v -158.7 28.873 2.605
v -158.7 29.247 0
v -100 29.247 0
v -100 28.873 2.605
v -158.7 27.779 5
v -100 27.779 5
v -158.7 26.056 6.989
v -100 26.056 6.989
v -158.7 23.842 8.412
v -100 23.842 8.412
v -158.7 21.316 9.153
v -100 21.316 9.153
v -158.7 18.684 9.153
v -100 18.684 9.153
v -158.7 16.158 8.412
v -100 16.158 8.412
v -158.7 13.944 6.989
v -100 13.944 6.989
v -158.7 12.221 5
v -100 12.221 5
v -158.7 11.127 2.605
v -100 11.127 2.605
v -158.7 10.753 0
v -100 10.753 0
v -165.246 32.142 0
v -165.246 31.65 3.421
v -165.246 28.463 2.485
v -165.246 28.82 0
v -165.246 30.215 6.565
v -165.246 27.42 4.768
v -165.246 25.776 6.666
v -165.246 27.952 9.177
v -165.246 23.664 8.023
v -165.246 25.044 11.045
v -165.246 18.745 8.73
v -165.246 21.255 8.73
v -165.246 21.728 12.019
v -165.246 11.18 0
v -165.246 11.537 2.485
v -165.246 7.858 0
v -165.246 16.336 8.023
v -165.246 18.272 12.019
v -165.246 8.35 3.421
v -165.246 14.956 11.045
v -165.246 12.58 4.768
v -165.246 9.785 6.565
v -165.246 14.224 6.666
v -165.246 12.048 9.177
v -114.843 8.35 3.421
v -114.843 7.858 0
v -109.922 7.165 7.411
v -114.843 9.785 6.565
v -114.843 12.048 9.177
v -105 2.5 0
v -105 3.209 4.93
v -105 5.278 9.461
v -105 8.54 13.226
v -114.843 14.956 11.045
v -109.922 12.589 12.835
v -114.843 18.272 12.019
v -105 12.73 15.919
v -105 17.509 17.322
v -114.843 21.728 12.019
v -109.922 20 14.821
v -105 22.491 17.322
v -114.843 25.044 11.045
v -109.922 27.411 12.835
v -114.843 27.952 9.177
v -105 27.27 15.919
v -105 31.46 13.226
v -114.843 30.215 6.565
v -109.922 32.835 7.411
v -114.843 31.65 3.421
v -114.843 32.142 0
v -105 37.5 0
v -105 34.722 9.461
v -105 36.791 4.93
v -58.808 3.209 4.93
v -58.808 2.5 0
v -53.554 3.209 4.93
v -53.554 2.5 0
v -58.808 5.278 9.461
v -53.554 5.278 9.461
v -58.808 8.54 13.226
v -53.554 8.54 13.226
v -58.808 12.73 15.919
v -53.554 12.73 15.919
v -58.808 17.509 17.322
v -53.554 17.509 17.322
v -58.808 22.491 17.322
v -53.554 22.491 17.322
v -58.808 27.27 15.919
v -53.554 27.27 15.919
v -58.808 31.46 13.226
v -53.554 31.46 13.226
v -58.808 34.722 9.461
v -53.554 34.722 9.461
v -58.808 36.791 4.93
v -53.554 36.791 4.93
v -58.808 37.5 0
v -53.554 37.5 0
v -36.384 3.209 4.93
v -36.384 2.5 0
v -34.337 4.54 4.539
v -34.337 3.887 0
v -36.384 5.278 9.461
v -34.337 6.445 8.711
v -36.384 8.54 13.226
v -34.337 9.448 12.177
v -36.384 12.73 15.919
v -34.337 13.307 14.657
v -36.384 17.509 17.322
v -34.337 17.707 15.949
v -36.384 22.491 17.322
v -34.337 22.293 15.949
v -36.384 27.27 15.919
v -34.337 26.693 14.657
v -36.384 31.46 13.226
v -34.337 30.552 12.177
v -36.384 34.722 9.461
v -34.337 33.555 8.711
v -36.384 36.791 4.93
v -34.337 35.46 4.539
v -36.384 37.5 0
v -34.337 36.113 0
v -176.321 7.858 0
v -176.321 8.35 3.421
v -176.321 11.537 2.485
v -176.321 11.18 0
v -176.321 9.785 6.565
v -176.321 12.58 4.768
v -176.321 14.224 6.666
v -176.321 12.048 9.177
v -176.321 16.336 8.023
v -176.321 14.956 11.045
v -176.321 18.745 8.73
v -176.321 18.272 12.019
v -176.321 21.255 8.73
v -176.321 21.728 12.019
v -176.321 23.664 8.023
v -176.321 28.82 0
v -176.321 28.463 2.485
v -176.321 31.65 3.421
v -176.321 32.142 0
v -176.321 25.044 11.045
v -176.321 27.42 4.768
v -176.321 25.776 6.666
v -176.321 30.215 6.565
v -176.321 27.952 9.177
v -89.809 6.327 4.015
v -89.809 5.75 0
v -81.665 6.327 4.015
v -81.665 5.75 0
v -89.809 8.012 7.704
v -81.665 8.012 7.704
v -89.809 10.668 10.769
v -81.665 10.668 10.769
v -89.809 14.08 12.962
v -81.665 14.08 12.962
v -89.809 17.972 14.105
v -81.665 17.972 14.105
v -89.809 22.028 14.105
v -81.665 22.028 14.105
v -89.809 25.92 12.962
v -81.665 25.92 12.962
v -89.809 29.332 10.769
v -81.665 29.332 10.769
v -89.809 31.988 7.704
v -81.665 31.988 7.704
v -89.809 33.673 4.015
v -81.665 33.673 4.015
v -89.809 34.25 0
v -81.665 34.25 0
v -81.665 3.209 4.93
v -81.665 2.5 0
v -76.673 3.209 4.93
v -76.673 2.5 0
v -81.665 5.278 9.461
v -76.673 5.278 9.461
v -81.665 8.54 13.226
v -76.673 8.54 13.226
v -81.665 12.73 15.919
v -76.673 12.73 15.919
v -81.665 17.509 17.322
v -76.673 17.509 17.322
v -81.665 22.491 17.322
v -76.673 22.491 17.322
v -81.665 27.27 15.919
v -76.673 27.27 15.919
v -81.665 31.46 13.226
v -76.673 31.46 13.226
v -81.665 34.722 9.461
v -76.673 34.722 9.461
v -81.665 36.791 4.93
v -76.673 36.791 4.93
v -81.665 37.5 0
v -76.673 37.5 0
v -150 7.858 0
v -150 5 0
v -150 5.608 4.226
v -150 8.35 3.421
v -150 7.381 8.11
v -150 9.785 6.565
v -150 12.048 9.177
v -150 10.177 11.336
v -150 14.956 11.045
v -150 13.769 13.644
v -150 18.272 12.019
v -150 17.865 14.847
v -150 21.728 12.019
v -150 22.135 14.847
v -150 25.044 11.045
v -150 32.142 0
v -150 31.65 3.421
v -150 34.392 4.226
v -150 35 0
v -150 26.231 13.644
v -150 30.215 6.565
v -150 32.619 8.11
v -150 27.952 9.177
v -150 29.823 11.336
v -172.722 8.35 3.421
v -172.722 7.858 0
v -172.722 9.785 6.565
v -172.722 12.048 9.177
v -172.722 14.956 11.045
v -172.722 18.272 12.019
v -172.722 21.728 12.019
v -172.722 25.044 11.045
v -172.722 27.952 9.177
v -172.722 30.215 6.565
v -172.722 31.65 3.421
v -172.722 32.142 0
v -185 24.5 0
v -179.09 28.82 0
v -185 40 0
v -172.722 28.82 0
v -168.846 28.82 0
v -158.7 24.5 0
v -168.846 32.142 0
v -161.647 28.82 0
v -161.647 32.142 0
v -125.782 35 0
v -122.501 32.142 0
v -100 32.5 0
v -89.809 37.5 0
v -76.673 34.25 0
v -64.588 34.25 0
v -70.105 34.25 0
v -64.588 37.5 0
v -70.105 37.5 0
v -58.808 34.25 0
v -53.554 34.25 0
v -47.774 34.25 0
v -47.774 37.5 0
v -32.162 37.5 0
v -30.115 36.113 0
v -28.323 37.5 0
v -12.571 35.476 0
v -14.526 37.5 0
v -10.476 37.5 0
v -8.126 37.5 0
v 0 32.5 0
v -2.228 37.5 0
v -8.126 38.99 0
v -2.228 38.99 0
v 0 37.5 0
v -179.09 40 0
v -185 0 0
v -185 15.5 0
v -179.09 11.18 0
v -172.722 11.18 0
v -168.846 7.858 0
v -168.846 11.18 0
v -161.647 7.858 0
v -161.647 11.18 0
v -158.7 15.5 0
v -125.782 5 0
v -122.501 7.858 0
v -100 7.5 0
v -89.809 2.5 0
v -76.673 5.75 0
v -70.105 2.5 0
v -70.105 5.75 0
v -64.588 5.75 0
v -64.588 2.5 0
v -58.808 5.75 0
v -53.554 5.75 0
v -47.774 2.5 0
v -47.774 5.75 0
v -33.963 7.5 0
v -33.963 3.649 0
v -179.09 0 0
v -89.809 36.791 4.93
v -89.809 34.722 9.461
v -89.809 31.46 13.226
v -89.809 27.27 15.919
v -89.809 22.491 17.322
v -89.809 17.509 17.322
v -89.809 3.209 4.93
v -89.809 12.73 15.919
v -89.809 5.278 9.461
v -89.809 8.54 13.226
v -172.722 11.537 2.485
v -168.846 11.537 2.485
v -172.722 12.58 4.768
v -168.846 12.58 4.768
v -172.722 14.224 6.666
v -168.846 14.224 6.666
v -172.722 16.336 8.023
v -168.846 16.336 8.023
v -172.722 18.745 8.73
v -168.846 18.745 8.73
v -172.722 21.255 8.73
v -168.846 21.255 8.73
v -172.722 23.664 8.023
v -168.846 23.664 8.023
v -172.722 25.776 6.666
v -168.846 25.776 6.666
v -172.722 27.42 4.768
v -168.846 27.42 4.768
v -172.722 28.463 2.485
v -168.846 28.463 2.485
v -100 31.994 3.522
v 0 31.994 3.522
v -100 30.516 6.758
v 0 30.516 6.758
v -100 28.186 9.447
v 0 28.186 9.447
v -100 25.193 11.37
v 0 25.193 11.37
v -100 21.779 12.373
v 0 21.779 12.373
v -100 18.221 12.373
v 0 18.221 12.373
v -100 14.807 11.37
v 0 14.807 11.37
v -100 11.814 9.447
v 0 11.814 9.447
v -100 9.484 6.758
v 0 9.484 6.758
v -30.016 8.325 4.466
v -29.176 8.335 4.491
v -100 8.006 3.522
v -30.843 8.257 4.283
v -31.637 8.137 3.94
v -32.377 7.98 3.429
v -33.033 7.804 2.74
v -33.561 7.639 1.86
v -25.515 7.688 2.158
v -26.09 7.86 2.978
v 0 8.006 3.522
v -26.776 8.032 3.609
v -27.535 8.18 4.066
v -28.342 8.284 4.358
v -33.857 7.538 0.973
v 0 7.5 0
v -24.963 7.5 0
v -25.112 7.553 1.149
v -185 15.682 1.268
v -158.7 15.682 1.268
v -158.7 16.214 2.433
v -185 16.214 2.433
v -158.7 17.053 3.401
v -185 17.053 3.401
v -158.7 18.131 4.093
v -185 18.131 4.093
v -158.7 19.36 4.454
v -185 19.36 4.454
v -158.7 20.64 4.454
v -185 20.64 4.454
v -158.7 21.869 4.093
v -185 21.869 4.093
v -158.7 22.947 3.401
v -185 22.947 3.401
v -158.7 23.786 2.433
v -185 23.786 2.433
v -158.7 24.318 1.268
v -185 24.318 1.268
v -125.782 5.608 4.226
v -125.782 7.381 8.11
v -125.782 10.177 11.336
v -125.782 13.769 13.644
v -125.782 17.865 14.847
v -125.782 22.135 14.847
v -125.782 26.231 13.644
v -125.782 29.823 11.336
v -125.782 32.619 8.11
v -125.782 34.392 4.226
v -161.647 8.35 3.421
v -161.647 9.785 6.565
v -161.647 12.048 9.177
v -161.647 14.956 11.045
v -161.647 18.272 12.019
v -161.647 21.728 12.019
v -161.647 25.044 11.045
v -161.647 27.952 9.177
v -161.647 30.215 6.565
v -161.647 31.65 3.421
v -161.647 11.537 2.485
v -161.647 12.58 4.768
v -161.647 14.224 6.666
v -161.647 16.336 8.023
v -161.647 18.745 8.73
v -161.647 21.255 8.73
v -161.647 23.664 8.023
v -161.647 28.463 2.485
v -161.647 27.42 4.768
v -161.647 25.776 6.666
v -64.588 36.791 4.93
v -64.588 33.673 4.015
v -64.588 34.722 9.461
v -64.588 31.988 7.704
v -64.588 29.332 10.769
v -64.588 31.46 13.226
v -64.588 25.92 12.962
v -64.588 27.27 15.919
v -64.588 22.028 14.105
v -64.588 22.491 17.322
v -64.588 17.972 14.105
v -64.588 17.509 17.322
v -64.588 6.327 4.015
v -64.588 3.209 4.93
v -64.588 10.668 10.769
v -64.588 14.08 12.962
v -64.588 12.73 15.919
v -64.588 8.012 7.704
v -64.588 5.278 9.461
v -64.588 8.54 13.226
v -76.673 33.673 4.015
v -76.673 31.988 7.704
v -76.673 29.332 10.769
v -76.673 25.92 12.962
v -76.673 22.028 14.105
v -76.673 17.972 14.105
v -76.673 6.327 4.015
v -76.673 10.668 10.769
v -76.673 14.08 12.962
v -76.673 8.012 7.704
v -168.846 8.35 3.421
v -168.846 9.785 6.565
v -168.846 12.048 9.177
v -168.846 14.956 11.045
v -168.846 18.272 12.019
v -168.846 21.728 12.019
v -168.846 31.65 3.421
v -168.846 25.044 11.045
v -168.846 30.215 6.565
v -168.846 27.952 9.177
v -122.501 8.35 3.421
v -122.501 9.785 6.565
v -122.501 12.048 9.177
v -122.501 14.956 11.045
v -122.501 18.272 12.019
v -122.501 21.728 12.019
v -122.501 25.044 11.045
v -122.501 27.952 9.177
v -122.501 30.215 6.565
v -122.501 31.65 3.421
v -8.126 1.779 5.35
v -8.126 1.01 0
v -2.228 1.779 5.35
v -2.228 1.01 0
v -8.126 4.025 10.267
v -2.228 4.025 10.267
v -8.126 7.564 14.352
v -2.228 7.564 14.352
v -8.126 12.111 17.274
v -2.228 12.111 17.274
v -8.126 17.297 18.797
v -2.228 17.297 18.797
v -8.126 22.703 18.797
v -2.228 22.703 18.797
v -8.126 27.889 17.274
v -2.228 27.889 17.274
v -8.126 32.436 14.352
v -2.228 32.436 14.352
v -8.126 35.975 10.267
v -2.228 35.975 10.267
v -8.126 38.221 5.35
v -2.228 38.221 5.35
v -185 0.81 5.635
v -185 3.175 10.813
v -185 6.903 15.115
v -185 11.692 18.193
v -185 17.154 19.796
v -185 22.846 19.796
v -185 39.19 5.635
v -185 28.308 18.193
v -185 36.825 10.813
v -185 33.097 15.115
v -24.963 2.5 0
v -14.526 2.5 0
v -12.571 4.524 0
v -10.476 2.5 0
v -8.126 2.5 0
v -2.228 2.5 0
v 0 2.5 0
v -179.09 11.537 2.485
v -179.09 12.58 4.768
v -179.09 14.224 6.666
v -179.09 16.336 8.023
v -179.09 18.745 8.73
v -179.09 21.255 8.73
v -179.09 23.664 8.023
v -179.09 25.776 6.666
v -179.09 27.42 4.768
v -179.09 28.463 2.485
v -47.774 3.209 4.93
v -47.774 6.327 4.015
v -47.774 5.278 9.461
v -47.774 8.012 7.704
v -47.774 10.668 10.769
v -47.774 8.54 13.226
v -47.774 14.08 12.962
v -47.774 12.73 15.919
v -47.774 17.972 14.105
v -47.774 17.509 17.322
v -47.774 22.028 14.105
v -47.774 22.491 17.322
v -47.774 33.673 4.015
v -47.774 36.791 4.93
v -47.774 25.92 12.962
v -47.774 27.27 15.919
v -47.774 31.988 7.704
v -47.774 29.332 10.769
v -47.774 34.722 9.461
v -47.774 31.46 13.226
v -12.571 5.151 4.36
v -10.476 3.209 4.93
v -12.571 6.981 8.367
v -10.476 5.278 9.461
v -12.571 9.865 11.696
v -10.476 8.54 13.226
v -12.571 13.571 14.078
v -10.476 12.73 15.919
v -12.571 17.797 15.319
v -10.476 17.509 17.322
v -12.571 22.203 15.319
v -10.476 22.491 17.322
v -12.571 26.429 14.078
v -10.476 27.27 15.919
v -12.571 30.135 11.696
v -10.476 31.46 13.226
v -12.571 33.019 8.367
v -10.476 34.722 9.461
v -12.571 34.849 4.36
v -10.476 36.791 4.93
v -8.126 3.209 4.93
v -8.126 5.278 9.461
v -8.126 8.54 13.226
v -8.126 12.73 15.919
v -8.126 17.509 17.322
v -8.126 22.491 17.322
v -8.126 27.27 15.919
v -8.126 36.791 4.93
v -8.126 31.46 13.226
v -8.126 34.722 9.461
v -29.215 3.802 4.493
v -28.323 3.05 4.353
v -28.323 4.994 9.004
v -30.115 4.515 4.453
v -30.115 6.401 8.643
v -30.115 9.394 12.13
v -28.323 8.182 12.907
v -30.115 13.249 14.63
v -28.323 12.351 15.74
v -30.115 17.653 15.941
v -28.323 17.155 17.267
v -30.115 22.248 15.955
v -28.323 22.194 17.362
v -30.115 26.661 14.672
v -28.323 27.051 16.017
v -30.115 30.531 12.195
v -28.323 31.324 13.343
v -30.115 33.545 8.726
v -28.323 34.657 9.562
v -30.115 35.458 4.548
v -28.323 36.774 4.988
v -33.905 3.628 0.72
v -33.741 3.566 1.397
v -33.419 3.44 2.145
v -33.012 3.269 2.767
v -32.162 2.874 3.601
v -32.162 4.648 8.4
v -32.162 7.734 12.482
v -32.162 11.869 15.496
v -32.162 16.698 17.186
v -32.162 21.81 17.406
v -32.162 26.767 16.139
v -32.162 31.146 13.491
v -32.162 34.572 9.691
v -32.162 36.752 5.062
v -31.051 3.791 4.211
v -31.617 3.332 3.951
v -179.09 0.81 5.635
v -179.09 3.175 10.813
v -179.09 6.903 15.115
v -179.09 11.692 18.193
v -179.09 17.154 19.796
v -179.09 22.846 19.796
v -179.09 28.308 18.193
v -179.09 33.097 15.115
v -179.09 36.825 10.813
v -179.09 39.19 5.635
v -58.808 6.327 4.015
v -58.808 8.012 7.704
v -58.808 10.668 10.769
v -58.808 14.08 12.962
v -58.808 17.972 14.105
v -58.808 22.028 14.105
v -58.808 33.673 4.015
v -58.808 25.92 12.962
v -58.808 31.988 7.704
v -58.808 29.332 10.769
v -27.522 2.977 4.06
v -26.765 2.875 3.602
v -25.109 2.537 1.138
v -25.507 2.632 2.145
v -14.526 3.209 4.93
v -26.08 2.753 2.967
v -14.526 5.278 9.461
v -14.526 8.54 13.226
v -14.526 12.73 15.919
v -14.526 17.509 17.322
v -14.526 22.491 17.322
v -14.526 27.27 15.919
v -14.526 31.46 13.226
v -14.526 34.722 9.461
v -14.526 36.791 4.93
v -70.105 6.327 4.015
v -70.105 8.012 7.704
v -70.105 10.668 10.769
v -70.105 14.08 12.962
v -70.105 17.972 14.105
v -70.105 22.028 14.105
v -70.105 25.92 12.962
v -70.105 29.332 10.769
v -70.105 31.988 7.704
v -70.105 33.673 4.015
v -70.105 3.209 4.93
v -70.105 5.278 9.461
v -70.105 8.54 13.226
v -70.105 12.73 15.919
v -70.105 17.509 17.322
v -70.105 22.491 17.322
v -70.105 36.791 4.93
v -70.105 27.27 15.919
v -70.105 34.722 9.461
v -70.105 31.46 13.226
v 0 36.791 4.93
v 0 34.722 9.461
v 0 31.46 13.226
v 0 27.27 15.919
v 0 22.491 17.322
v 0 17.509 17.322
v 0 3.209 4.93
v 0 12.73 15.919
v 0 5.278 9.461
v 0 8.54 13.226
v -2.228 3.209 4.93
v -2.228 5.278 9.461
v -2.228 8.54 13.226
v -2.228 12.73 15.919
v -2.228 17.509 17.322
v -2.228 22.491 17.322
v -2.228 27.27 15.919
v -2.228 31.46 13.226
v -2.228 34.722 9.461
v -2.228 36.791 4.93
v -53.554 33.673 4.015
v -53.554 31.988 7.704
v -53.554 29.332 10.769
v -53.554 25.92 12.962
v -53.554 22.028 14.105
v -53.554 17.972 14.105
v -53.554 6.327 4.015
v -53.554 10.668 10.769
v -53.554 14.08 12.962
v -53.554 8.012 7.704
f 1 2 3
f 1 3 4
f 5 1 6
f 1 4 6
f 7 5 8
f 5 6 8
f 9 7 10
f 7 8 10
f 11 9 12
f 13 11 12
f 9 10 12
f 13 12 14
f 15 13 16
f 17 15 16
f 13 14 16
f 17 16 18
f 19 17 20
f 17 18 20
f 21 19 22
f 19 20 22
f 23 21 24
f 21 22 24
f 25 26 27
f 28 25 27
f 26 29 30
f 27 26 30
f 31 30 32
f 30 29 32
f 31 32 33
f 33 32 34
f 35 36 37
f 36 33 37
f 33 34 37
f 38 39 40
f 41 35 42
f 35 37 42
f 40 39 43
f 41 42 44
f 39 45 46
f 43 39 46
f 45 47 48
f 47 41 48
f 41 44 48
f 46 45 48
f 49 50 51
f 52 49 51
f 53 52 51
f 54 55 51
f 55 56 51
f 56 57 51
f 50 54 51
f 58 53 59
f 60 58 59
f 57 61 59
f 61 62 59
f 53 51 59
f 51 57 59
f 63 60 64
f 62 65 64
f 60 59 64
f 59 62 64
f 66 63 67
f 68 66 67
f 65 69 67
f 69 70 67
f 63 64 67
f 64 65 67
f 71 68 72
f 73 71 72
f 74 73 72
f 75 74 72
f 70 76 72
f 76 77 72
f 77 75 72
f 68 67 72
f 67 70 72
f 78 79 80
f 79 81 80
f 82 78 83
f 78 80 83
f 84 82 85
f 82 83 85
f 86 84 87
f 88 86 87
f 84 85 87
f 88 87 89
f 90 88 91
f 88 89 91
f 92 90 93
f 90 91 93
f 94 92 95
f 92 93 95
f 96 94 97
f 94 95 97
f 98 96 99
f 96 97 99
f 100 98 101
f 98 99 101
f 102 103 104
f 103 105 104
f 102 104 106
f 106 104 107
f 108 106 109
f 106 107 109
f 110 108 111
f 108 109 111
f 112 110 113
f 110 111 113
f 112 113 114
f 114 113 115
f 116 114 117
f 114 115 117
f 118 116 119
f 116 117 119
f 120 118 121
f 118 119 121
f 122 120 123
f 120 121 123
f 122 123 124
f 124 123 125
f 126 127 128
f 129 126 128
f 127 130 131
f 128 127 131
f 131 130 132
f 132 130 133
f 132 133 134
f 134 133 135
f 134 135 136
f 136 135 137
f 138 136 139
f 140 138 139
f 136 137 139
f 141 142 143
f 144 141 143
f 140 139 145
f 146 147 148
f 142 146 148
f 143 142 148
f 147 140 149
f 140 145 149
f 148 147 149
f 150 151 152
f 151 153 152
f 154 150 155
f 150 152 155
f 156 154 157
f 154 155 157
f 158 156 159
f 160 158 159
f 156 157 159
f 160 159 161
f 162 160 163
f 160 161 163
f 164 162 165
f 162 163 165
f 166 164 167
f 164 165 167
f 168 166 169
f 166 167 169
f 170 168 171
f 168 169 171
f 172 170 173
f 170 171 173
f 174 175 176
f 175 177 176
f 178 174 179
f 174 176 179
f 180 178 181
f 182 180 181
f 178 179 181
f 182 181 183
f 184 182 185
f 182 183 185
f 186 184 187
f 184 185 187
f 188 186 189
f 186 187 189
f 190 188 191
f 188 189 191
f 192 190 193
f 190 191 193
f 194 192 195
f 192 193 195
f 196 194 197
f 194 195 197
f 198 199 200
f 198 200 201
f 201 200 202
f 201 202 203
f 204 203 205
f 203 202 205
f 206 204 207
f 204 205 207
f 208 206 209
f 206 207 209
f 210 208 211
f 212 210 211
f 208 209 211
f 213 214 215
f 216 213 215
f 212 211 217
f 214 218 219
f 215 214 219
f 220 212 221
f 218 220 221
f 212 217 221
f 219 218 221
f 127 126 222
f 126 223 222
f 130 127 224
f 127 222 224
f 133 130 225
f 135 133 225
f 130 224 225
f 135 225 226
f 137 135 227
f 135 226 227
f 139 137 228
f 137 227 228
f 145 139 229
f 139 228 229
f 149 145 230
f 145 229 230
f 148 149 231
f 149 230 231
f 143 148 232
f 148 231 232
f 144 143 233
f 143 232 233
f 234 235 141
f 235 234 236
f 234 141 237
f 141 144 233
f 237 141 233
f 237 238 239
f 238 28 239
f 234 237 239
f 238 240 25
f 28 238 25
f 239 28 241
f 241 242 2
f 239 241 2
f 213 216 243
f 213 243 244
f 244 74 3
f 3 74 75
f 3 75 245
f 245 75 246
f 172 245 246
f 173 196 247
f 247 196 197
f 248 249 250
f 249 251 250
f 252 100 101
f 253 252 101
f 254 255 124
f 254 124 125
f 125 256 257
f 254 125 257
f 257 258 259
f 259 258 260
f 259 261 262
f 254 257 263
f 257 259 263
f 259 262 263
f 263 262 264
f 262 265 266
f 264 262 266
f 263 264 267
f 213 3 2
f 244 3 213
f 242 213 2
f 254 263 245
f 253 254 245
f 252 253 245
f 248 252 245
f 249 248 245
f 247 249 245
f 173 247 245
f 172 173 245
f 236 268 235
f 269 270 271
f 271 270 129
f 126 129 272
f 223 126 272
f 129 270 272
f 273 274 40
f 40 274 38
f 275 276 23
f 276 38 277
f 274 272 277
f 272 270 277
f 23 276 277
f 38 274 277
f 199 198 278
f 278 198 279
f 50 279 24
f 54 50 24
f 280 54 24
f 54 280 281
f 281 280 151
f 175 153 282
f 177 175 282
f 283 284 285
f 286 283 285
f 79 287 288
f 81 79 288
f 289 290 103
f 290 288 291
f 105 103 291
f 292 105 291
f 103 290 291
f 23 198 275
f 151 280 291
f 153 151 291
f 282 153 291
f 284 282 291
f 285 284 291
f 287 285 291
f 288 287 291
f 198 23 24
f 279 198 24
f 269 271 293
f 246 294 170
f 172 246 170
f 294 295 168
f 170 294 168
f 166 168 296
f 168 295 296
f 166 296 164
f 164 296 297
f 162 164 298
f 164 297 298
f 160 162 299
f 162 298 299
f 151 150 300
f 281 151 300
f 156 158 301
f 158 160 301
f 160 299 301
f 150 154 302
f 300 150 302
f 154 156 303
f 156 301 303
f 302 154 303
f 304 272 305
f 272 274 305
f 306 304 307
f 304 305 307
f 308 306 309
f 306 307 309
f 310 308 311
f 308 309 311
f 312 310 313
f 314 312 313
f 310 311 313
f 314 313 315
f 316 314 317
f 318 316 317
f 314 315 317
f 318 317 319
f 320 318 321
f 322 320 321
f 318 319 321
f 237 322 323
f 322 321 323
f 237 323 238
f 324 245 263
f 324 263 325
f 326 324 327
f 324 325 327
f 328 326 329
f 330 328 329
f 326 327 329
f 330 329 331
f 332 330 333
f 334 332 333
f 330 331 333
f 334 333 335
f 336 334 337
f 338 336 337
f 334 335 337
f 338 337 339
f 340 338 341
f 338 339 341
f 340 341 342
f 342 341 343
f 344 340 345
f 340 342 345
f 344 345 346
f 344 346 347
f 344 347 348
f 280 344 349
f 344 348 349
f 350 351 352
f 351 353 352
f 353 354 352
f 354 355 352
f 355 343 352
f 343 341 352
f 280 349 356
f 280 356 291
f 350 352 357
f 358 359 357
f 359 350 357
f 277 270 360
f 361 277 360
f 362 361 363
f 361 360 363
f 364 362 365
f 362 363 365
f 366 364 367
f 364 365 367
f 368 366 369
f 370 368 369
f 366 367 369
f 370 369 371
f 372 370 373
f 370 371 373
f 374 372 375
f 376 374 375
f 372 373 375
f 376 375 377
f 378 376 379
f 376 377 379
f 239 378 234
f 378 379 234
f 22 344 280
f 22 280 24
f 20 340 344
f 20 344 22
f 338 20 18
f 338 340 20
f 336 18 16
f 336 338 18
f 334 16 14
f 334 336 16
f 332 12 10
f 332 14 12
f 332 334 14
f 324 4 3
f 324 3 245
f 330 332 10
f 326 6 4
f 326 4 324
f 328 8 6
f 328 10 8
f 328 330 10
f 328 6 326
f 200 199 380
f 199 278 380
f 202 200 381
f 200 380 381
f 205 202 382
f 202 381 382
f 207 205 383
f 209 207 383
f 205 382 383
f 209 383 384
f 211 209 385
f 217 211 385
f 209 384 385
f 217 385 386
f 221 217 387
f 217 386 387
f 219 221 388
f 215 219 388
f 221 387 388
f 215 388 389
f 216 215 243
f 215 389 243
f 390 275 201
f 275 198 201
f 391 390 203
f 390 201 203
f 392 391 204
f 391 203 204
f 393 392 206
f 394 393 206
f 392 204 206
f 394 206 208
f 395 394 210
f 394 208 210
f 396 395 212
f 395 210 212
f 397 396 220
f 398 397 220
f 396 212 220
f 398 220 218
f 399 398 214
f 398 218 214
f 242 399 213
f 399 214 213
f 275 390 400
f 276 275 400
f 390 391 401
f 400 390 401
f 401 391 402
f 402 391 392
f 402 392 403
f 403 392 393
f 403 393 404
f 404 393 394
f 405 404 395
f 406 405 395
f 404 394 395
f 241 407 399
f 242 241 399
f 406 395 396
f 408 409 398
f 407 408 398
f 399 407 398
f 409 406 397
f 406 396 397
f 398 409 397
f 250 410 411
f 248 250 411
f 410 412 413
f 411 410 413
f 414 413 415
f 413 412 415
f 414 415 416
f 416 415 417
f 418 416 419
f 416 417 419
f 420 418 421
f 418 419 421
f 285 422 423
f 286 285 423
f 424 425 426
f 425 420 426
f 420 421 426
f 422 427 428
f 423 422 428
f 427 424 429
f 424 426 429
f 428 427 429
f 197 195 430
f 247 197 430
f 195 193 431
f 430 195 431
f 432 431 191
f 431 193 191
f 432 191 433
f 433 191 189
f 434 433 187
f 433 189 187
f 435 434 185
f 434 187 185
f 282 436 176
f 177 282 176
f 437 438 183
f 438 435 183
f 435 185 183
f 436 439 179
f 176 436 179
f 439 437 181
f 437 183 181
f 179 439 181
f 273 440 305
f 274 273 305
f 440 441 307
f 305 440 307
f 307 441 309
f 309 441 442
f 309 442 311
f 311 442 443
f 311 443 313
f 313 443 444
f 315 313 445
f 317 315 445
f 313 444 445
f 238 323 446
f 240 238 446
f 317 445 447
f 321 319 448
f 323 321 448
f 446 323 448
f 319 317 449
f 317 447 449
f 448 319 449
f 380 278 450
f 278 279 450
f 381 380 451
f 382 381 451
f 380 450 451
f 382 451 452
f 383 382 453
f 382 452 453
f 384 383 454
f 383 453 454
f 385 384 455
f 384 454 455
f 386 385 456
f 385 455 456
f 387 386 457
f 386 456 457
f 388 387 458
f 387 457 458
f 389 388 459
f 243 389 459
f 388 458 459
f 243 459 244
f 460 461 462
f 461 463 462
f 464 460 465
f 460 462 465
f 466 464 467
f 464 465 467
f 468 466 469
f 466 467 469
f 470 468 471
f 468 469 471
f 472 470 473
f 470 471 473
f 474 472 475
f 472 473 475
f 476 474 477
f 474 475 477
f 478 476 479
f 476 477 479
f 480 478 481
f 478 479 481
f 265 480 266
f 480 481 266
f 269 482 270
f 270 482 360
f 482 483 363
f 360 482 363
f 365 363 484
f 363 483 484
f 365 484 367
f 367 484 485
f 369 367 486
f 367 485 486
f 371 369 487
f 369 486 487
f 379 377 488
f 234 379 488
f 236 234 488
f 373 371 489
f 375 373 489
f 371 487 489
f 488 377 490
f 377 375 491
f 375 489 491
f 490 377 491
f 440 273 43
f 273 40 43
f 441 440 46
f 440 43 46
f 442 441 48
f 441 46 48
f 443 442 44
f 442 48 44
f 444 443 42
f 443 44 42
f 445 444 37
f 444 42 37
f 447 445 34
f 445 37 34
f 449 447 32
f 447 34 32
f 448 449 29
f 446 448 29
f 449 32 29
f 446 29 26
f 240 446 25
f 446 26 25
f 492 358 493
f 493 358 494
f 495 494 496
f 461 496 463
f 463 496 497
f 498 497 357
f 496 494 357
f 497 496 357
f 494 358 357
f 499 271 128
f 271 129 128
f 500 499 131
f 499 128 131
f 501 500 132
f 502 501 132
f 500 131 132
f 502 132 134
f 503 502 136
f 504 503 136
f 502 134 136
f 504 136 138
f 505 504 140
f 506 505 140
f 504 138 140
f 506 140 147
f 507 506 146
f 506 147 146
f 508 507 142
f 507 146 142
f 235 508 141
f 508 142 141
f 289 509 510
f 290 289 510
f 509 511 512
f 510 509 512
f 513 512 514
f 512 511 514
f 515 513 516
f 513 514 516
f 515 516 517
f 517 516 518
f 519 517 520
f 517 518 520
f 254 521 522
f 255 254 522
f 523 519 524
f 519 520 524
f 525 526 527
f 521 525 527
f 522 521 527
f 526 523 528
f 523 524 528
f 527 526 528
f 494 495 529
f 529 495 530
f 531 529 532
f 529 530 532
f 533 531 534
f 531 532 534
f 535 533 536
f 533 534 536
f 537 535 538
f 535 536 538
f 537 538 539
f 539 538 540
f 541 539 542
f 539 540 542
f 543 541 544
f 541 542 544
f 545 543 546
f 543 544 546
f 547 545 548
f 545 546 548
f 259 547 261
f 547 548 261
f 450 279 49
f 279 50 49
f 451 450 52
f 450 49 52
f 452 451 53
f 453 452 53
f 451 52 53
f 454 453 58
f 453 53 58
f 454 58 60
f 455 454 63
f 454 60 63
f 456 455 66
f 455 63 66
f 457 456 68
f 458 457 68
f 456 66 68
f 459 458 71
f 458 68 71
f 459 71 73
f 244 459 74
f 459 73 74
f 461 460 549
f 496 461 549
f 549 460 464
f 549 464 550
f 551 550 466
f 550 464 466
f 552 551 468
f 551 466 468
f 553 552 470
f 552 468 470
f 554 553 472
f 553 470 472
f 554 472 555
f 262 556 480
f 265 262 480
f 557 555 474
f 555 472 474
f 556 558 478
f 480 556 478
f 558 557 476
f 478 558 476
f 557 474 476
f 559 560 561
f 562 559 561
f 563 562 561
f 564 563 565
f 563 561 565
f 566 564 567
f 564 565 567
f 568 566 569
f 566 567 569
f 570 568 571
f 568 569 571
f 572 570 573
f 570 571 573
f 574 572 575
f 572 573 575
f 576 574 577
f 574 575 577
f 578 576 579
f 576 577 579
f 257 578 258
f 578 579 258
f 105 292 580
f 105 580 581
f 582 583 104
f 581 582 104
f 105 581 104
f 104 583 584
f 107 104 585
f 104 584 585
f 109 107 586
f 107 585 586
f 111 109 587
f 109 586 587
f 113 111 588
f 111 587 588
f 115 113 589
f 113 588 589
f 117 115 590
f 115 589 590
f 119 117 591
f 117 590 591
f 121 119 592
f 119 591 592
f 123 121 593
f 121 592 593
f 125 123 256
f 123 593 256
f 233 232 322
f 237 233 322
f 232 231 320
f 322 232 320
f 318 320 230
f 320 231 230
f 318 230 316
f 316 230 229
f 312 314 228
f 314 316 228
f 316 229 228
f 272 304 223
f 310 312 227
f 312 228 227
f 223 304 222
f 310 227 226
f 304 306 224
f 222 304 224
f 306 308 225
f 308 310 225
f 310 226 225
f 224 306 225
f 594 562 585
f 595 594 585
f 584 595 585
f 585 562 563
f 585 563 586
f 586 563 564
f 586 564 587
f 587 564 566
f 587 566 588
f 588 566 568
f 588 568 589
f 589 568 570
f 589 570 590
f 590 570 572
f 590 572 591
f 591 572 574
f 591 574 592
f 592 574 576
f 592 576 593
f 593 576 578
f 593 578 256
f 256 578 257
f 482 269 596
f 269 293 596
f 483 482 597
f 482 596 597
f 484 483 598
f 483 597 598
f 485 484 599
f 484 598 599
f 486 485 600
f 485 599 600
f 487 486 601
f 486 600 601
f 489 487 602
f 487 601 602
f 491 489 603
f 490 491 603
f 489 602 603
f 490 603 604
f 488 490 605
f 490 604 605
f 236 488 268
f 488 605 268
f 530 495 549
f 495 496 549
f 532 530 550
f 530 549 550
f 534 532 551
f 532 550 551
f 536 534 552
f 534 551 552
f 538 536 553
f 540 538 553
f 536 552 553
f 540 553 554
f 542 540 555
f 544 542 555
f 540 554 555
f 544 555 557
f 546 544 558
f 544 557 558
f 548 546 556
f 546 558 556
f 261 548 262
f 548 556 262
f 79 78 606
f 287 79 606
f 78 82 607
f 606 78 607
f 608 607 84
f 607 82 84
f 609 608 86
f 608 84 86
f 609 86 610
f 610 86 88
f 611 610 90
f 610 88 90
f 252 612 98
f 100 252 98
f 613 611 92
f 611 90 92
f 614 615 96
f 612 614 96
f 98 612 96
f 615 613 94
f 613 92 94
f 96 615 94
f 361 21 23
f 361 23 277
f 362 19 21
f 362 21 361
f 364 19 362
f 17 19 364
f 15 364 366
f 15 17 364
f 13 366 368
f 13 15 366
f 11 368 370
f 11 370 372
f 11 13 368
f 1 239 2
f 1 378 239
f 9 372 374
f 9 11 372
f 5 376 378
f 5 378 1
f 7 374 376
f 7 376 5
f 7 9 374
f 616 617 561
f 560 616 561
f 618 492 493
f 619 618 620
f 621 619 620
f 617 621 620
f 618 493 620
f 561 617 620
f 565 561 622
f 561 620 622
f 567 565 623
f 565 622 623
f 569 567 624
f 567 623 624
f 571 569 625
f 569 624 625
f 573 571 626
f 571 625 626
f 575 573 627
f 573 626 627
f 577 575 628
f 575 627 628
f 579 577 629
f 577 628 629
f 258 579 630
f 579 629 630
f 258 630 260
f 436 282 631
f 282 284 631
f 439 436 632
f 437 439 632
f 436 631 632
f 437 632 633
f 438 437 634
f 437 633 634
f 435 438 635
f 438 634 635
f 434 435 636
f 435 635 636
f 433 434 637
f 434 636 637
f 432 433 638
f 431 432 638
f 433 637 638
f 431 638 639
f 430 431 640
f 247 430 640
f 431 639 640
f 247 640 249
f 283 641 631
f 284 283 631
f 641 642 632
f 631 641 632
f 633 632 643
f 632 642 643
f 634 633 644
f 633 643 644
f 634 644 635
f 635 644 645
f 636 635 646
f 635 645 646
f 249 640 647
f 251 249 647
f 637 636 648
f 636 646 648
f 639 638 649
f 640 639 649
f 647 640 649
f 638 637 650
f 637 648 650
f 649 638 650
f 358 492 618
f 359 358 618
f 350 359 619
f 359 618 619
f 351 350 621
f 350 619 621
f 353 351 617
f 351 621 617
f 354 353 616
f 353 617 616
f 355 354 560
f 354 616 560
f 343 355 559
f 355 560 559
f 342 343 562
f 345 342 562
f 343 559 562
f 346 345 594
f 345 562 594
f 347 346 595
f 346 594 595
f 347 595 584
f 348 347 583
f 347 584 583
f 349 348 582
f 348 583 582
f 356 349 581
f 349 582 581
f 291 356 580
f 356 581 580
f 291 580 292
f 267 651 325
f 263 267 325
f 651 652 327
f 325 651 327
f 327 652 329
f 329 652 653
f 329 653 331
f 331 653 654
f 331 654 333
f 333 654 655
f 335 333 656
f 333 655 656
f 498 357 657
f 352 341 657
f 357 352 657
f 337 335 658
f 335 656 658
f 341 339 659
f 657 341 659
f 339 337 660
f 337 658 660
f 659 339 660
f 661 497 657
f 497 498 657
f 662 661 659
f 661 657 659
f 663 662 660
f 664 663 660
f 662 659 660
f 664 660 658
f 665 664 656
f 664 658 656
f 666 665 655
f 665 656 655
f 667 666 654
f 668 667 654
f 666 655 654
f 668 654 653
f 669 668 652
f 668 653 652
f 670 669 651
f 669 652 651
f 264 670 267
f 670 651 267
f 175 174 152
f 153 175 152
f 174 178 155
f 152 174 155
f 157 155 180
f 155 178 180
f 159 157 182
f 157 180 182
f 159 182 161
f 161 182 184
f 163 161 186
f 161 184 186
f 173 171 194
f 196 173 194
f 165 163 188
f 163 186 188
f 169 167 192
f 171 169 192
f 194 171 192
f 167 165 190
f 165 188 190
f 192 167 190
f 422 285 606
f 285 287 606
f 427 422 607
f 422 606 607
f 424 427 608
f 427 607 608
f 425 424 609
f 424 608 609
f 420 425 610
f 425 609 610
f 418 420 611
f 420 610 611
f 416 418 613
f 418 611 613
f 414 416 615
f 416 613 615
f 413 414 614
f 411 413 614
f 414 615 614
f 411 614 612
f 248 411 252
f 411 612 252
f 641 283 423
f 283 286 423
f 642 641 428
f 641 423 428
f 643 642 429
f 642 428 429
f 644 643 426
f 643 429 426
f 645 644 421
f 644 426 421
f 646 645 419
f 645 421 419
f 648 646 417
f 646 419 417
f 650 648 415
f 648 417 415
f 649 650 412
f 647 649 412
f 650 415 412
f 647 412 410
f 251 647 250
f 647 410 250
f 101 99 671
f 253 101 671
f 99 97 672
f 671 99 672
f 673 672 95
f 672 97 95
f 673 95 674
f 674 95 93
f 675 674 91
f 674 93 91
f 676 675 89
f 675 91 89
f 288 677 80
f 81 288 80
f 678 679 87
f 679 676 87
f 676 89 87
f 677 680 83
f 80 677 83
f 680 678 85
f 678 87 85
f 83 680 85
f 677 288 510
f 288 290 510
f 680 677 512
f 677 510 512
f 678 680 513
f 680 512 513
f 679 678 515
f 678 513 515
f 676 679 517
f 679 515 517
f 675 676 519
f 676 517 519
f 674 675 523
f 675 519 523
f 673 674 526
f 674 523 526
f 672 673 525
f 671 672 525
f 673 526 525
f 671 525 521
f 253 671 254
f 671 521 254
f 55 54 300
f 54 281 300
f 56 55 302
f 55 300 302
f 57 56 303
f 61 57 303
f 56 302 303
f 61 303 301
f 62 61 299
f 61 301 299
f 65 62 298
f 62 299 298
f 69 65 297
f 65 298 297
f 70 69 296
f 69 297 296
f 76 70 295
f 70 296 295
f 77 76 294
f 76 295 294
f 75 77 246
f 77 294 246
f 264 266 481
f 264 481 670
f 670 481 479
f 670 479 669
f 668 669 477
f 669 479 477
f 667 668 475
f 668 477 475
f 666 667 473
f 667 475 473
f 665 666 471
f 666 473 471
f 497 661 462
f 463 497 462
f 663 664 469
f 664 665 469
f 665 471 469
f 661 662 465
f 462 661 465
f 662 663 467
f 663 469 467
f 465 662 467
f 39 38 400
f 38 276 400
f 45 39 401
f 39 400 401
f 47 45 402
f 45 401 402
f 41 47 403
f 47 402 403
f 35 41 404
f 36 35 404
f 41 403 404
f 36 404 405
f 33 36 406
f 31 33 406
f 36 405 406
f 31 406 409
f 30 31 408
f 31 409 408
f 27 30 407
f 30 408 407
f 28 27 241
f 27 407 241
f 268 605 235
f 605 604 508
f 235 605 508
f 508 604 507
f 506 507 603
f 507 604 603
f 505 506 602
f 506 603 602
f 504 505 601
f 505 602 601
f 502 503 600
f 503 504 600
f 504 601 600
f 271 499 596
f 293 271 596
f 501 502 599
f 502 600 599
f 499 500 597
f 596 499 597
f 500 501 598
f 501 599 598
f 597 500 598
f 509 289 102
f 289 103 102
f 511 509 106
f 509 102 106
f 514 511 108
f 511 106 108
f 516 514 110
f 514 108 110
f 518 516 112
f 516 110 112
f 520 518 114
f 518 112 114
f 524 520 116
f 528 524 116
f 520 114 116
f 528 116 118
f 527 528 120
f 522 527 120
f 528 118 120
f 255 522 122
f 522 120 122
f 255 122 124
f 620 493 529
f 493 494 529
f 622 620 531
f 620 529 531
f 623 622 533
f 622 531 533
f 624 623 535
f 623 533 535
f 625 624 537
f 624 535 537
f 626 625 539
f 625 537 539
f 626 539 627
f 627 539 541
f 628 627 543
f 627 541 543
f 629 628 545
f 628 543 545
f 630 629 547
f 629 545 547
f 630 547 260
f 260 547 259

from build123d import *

# Parameters (mm, degrees)
F1_ANGLE = -180
F2_R     = 4.5
F3_DEPTH = 127.6
F4_R     = 12.5
F5_DEPTH = 100
F6_R     = 4.5
F7_DEPTH = 16.8
F8_R     = 9.247481
F9_DEPTH = 58.7


with BuildPart() as f1:
    # F0 (on Top) → F1 (revolve)
    with BuildSketch(Plane.XY):
        Polygon((-150, 5), (-125.782207, 5), (-122.500561, 7.857719), (-114.843413, 7.857719), (-105, 2.5), (-89.808904, 2.5), (-89.808904, 5.75), (-81.664719, 5.75), (-81.664719, 2.5), (-76.673128, 2.5), (-76.673128, 5.75), (-70.105232, 5.75), (-70.105232, 2.5), (-64.588204, 2.5), (-64.588204, 5.75), (-58.808461, 5.75), (-58.808461, 2.5), (-53.554147, 2.5), (-53.554147, 5.75), (-47.774404, 5.75), (-47.774404, 2.5), (-36.38434, 2.5), (-34.337129, 3.887209), (-32.161966, 2.5), (-30.114755, 3.887209), (-28.323445, 2.5), (-14.525713, 2.5), (-12.570513, 4.523719), (-10.475874, 2.5), (-8.125912, 2.5), (-8.125912, 1.010104), (-2.228058, 1.010104), (-2.228058, 2.5), (0, 2.5), (0, 20), (-185, 20), (-185, 0), (-179.089636, 0), (-179.089636, 11.18013), (-176.320955, 11.18013), (-176.320955, 7.857719), (-172.721684, 7.857719), (-172.721684, 11.18013), (-168.845534, 11.18013), (-168.845534, 7.857719), (-165.246248, 7.857719), (-165.246248, 11.18013), (-161.646977, 11.18013), (-161.646977, 7.857719), (-150, 7.857719), align=None)
    revolve(axis=Axis((-92.5, 20, 0), (1, 0, 0)), revolution_arc=F1_ANGLE)

    # F2 (on face) → F3 (cut)
    with BuildSketch(Plane(origin=(-185, 0, 0), x_dir=(0, -1, 0), z_dir=(-1, 0, 0))):
        with Locations((-20, 0)):
            Circle(F2_R)
    extrude(amount=-F3_DEPTH, mode=Mode.SUBTRACT)

    # F4 (on face) → F5 (cut)
    with BuildSketch(Plane.YZ):
        with Locations((20, 0)):
            Circle(F4_R)
    extrude(amount=-F5_DEPTH, mode=Mode.SUBTRACT)

    # F6 (on Front) → F7 (cut)
    with BuildSketch(Plane.XZ):
        with Locations((-29.463233, 0)):
            Circle(F6_R)
    extrude(amount=-F7_DEPTH, mode=Mode.SUBTRACT)

    # F8 (on face) → F9 (cut)
    with BuildSketch(Plane.YZ.offset(-100)):
        with Locations((20, 0)):
            Circle(F8_R)
    extrude(amount=-F9_DEPTH, mode=Mode.SUBTRACT)


solid = f1.part
